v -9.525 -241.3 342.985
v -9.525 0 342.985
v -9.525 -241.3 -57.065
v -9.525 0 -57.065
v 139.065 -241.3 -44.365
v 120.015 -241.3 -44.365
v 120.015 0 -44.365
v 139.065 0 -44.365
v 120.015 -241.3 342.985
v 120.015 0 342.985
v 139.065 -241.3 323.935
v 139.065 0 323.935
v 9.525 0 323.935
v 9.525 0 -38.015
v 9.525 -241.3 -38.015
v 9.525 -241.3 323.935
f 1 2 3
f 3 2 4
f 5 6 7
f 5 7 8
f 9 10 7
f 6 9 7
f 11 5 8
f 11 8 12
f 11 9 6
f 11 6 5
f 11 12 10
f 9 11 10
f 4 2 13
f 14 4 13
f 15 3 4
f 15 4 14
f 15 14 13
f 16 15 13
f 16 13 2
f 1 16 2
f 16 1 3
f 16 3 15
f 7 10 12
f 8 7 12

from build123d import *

# Parameters (mm, degrees)
F1_DEPTH = 241.3
F4_DEPTH = 241.3
F5_W     = 19.05
F5_H     = 12.7
F6_DEPTH = 241.301


with BuildPart() as f1:
    # F0 (on Front) → F1 (new body)
    with BuildSketch(Plane.XZ):
        Polygon((9.525, 323.93477), (-9.525, 342.98477), (-9.525, -57.06523), (9.525, -38.01523), align=None)
    extrude(amount=F1_DEPTH)


with BuildPart() as f2_1:
    # F2: copy of F1
    add(f1.part.moved(Location((129.54, 0, 0))))

    # F3 (on face) → F4 (join)
    with BuildSketch(Plane.XZ.offset(241.3)):
        Polygon((139.065, -38.01523), (120.015, -57.06523), (139.065, -57.06523), align=None)
    extrude(amount=-F4_DEPTH)

    # F5 (on face) → F6 (cut, through all)
    with BuildSketch(Plane.XZ.offset(241.3)):
        with Locations((129.54, -50.71523)):
            Rectangle(F5_W, F5_H)
    extrude(amount=-F6_DEPTH, mode=Mode.SUBTRACT)


solid = Compound([f1.part, f2_1.part])
